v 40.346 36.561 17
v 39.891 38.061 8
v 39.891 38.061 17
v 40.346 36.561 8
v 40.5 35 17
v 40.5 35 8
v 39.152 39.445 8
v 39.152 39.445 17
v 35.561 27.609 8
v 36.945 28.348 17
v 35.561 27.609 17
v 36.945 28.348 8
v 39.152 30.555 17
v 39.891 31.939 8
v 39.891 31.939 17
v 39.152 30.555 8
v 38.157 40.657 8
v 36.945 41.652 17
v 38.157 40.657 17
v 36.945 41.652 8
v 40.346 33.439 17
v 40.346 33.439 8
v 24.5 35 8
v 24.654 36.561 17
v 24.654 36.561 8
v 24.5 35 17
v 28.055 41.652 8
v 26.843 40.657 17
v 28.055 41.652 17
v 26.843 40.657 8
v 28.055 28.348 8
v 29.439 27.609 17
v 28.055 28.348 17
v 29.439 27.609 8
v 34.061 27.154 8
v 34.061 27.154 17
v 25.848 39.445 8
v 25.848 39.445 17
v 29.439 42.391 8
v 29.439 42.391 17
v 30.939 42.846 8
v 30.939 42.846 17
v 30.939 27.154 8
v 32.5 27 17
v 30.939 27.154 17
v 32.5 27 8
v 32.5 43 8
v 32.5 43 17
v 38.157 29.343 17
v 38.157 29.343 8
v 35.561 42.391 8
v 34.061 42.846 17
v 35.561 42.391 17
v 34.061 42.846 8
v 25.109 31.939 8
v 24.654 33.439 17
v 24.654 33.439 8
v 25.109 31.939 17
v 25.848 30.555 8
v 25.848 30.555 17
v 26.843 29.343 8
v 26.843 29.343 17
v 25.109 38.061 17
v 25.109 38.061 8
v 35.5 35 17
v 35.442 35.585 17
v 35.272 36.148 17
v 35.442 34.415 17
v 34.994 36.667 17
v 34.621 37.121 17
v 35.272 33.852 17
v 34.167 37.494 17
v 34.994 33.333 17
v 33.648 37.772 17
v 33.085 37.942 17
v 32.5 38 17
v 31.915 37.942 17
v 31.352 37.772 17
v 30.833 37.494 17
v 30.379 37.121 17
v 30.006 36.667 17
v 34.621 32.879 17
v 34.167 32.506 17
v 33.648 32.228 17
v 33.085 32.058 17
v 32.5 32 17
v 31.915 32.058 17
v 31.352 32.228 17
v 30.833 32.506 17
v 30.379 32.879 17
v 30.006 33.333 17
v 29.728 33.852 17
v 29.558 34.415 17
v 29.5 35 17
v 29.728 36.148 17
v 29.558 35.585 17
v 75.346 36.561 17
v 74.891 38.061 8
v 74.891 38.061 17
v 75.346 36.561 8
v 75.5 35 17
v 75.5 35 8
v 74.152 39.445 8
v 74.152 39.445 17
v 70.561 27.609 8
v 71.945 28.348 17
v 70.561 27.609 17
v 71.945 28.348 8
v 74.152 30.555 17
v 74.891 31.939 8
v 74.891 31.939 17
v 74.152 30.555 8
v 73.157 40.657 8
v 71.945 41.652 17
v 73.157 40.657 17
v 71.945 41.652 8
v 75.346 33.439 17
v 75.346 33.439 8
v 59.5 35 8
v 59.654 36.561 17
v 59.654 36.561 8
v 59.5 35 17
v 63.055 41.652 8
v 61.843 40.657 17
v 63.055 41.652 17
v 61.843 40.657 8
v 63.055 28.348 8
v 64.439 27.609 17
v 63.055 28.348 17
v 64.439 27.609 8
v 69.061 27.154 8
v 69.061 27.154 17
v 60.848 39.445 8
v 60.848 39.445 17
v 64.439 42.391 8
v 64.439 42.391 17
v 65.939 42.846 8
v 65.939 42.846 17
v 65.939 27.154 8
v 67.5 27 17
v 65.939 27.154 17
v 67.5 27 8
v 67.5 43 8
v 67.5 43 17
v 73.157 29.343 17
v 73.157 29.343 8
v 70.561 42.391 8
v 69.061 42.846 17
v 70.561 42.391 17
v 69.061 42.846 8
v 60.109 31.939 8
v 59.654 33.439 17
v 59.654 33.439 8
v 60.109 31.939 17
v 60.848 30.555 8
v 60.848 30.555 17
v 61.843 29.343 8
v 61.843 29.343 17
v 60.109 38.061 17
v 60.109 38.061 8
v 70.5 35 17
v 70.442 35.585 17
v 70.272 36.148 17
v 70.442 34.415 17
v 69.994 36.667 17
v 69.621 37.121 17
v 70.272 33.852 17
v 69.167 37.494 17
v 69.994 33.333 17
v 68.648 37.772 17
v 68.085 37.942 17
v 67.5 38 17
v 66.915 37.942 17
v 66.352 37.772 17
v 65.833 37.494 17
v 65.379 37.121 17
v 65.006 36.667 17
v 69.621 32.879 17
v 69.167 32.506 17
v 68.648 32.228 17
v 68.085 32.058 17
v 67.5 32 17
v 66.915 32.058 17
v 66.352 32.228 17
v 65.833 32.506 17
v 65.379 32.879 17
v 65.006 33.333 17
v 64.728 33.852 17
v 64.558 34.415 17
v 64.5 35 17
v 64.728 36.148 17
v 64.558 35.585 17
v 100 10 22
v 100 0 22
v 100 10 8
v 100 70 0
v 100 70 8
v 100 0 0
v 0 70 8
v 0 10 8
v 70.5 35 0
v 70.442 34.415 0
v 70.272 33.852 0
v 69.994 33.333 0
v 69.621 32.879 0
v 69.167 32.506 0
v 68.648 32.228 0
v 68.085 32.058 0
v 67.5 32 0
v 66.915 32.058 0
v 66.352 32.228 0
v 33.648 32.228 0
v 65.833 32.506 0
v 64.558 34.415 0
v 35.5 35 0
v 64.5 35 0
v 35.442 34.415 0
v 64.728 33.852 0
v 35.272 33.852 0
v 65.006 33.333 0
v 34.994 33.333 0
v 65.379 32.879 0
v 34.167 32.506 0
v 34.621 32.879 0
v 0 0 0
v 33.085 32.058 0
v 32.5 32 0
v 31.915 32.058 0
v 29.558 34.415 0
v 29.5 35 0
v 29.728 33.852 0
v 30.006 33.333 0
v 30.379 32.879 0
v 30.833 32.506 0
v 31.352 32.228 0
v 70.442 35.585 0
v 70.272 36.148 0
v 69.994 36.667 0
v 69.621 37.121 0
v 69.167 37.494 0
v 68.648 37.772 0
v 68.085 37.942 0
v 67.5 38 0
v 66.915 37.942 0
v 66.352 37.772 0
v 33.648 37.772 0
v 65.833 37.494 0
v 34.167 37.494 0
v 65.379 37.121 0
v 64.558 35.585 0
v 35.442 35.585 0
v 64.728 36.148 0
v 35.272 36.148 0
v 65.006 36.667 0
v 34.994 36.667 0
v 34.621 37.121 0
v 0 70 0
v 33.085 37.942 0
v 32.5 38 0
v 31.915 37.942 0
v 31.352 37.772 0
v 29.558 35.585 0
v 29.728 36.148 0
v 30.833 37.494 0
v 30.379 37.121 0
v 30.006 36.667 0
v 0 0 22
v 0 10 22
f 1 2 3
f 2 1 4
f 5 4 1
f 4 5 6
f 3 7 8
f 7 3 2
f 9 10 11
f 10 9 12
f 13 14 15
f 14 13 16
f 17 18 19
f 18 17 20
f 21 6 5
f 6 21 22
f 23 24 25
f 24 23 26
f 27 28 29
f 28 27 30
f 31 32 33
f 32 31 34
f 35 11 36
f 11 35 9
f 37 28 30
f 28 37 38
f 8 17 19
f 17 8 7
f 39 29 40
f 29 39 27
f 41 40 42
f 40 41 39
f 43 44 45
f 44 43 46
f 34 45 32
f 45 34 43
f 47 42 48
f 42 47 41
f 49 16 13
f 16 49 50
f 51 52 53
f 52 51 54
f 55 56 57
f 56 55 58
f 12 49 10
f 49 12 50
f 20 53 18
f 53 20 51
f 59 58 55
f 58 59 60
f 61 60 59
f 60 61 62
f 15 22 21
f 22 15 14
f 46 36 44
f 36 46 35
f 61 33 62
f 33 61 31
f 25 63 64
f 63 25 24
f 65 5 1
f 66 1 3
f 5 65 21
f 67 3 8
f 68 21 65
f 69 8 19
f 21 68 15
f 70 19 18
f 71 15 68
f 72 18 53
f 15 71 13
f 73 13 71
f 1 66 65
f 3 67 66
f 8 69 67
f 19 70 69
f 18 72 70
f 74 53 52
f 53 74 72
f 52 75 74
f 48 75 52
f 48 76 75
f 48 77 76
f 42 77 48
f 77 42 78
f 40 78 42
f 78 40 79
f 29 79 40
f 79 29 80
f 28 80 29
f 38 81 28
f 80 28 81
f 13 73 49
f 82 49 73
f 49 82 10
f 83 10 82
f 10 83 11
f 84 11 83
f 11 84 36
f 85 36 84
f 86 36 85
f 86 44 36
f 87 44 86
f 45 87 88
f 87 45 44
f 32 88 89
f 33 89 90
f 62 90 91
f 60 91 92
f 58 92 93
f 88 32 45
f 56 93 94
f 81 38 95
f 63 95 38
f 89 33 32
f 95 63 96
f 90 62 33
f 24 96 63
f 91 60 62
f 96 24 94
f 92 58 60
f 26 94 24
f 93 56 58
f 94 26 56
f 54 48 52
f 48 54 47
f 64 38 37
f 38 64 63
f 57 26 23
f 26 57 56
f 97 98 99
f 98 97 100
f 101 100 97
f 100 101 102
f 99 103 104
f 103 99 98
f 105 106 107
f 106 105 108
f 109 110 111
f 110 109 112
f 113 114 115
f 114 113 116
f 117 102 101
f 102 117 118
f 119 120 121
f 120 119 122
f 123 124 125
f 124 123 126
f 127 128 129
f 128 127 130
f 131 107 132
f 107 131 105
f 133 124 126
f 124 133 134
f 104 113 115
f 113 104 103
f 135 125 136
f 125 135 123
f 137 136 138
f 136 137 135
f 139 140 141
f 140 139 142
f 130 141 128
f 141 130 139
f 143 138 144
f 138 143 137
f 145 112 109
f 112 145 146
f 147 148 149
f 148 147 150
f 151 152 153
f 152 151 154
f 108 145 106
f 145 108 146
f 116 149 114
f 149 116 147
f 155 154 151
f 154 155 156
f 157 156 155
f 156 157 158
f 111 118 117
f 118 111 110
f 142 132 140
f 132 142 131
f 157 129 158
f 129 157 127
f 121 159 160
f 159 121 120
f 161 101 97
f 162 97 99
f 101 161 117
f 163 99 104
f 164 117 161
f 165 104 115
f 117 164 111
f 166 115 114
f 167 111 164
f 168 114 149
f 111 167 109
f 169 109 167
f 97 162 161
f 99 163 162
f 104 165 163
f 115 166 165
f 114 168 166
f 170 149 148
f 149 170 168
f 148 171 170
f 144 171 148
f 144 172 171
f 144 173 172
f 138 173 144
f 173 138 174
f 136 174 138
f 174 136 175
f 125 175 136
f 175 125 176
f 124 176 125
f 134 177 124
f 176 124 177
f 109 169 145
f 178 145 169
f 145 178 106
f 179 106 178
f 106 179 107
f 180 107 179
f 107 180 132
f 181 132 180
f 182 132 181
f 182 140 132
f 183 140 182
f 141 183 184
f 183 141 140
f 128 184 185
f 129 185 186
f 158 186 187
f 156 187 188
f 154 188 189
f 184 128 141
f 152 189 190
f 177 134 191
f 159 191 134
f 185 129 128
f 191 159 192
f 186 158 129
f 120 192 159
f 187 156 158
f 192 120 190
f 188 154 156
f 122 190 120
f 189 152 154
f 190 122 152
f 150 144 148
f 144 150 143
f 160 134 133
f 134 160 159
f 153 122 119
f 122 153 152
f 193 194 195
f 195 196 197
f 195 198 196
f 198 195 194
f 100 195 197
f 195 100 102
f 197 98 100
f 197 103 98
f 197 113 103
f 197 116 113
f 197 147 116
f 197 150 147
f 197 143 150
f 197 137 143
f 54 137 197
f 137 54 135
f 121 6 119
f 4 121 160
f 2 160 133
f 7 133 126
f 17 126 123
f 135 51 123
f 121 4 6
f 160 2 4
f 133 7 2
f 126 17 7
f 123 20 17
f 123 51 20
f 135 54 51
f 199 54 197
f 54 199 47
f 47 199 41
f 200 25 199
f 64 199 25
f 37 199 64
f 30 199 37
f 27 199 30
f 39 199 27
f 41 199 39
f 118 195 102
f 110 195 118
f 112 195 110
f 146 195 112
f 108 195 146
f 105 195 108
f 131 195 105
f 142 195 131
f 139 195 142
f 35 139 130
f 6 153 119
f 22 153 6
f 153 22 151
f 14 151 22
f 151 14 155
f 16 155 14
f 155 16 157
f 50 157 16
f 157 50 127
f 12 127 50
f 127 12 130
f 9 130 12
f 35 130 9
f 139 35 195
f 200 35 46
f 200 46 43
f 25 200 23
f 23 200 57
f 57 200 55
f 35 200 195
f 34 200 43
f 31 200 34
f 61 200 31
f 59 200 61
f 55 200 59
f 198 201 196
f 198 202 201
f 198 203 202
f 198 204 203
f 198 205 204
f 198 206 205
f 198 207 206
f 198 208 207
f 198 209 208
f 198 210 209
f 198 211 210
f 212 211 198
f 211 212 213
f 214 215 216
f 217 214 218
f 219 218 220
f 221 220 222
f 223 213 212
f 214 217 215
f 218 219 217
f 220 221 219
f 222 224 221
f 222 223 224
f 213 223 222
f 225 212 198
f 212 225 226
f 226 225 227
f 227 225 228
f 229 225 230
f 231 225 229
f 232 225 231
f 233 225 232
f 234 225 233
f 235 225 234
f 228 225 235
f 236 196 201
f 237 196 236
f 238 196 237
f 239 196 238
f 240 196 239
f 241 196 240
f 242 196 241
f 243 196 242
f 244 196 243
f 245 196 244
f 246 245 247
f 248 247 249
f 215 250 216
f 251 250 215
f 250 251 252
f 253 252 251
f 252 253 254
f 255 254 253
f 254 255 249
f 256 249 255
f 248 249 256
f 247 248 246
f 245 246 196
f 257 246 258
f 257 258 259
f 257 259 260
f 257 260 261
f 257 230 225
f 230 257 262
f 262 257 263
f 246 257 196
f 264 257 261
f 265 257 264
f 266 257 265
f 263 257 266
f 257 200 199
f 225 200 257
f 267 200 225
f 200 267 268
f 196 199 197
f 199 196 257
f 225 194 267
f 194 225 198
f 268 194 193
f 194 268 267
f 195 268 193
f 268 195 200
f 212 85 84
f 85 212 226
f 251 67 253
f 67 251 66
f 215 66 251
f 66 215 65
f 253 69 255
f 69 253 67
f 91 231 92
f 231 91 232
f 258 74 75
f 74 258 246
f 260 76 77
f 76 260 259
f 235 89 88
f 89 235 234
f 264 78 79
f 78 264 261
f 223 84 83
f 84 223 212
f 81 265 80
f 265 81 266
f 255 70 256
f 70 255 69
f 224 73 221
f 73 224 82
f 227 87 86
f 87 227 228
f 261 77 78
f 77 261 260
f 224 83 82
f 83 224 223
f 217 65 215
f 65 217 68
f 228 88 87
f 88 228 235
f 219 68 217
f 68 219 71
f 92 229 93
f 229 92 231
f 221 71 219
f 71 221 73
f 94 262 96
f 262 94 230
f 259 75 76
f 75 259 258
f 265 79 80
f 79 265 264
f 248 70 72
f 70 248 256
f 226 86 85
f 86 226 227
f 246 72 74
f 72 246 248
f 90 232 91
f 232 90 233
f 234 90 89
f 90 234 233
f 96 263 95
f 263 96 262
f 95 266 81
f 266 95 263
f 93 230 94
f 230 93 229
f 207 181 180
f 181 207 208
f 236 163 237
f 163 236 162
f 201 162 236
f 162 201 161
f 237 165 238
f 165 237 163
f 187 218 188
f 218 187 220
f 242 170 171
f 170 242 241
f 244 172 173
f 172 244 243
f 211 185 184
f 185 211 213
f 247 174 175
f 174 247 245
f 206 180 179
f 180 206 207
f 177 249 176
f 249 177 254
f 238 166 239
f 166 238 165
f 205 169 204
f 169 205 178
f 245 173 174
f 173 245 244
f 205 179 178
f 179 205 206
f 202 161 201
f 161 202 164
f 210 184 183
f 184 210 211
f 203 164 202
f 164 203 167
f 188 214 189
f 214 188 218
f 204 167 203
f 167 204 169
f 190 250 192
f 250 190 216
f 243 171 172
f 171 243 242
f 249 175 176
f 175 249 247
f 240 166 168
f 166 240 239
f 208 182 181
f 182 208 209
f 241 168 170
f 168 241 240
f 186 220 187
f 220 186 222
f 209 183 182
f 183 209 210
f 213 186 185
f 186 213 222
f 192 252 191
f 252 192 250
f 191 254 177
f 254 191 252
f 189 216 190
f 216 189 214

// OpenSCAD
$fn = 32;

// ----------------------------------------------------------------------
// Drill jig: fence jig
// ----------------------------------------------------------------------

// --- parameters (mm) ---
plate_l = 100;            // plate length, X
plate_w = 70;             // plate width, Y
plate_t = 8;              // plate thickness
boss_d = 16;              // guide boss diameter
boss_h = 10;              // boss height above the plate
guide_d = 6;              // guide hole diameter
boss_pitch = 35;          // boss pitch
fence_h = 15;             // fence height above the plate
fence_t = 10;             // fence thickness
fit_tol = 0.1;            // tolerance for press fits, mm
free_tol = 0.5;           // tolerance for clearance fits, mm

n_boss = 2;  // guide bosses
boss_x0 = (plate_l - (n_boss - 1) * boss_pitch) / 2;  // first boss X
boss_top = plate_t - 1 + boss_h;  // boss crown height
fence_top = plate_t - 1 + fence_h;  // fence crown height
total_h = max([fence_top, boss_top]);  // overall height

difference() {
  union() {
  cube([plate_l, plate_w, plate_t]);
  for (i = [0 : n_boss - 1])
    translate([boss_x0 + i * boss_pitch, plate_w / 2, plate_t - 1])
      cylinder(h = boss_h, d = boss_d);
  translate([0, 0, plate_t - 1]) cube([plate_l, fence_t, fence_h]);
  }
  for (i = [0 : n_boss - 1])
    translate([boss_x0 + i * boss_pitch, plate_w / 2, -1])
      cylinder(h = plate_t + boss_h, d = guide_d);
}
